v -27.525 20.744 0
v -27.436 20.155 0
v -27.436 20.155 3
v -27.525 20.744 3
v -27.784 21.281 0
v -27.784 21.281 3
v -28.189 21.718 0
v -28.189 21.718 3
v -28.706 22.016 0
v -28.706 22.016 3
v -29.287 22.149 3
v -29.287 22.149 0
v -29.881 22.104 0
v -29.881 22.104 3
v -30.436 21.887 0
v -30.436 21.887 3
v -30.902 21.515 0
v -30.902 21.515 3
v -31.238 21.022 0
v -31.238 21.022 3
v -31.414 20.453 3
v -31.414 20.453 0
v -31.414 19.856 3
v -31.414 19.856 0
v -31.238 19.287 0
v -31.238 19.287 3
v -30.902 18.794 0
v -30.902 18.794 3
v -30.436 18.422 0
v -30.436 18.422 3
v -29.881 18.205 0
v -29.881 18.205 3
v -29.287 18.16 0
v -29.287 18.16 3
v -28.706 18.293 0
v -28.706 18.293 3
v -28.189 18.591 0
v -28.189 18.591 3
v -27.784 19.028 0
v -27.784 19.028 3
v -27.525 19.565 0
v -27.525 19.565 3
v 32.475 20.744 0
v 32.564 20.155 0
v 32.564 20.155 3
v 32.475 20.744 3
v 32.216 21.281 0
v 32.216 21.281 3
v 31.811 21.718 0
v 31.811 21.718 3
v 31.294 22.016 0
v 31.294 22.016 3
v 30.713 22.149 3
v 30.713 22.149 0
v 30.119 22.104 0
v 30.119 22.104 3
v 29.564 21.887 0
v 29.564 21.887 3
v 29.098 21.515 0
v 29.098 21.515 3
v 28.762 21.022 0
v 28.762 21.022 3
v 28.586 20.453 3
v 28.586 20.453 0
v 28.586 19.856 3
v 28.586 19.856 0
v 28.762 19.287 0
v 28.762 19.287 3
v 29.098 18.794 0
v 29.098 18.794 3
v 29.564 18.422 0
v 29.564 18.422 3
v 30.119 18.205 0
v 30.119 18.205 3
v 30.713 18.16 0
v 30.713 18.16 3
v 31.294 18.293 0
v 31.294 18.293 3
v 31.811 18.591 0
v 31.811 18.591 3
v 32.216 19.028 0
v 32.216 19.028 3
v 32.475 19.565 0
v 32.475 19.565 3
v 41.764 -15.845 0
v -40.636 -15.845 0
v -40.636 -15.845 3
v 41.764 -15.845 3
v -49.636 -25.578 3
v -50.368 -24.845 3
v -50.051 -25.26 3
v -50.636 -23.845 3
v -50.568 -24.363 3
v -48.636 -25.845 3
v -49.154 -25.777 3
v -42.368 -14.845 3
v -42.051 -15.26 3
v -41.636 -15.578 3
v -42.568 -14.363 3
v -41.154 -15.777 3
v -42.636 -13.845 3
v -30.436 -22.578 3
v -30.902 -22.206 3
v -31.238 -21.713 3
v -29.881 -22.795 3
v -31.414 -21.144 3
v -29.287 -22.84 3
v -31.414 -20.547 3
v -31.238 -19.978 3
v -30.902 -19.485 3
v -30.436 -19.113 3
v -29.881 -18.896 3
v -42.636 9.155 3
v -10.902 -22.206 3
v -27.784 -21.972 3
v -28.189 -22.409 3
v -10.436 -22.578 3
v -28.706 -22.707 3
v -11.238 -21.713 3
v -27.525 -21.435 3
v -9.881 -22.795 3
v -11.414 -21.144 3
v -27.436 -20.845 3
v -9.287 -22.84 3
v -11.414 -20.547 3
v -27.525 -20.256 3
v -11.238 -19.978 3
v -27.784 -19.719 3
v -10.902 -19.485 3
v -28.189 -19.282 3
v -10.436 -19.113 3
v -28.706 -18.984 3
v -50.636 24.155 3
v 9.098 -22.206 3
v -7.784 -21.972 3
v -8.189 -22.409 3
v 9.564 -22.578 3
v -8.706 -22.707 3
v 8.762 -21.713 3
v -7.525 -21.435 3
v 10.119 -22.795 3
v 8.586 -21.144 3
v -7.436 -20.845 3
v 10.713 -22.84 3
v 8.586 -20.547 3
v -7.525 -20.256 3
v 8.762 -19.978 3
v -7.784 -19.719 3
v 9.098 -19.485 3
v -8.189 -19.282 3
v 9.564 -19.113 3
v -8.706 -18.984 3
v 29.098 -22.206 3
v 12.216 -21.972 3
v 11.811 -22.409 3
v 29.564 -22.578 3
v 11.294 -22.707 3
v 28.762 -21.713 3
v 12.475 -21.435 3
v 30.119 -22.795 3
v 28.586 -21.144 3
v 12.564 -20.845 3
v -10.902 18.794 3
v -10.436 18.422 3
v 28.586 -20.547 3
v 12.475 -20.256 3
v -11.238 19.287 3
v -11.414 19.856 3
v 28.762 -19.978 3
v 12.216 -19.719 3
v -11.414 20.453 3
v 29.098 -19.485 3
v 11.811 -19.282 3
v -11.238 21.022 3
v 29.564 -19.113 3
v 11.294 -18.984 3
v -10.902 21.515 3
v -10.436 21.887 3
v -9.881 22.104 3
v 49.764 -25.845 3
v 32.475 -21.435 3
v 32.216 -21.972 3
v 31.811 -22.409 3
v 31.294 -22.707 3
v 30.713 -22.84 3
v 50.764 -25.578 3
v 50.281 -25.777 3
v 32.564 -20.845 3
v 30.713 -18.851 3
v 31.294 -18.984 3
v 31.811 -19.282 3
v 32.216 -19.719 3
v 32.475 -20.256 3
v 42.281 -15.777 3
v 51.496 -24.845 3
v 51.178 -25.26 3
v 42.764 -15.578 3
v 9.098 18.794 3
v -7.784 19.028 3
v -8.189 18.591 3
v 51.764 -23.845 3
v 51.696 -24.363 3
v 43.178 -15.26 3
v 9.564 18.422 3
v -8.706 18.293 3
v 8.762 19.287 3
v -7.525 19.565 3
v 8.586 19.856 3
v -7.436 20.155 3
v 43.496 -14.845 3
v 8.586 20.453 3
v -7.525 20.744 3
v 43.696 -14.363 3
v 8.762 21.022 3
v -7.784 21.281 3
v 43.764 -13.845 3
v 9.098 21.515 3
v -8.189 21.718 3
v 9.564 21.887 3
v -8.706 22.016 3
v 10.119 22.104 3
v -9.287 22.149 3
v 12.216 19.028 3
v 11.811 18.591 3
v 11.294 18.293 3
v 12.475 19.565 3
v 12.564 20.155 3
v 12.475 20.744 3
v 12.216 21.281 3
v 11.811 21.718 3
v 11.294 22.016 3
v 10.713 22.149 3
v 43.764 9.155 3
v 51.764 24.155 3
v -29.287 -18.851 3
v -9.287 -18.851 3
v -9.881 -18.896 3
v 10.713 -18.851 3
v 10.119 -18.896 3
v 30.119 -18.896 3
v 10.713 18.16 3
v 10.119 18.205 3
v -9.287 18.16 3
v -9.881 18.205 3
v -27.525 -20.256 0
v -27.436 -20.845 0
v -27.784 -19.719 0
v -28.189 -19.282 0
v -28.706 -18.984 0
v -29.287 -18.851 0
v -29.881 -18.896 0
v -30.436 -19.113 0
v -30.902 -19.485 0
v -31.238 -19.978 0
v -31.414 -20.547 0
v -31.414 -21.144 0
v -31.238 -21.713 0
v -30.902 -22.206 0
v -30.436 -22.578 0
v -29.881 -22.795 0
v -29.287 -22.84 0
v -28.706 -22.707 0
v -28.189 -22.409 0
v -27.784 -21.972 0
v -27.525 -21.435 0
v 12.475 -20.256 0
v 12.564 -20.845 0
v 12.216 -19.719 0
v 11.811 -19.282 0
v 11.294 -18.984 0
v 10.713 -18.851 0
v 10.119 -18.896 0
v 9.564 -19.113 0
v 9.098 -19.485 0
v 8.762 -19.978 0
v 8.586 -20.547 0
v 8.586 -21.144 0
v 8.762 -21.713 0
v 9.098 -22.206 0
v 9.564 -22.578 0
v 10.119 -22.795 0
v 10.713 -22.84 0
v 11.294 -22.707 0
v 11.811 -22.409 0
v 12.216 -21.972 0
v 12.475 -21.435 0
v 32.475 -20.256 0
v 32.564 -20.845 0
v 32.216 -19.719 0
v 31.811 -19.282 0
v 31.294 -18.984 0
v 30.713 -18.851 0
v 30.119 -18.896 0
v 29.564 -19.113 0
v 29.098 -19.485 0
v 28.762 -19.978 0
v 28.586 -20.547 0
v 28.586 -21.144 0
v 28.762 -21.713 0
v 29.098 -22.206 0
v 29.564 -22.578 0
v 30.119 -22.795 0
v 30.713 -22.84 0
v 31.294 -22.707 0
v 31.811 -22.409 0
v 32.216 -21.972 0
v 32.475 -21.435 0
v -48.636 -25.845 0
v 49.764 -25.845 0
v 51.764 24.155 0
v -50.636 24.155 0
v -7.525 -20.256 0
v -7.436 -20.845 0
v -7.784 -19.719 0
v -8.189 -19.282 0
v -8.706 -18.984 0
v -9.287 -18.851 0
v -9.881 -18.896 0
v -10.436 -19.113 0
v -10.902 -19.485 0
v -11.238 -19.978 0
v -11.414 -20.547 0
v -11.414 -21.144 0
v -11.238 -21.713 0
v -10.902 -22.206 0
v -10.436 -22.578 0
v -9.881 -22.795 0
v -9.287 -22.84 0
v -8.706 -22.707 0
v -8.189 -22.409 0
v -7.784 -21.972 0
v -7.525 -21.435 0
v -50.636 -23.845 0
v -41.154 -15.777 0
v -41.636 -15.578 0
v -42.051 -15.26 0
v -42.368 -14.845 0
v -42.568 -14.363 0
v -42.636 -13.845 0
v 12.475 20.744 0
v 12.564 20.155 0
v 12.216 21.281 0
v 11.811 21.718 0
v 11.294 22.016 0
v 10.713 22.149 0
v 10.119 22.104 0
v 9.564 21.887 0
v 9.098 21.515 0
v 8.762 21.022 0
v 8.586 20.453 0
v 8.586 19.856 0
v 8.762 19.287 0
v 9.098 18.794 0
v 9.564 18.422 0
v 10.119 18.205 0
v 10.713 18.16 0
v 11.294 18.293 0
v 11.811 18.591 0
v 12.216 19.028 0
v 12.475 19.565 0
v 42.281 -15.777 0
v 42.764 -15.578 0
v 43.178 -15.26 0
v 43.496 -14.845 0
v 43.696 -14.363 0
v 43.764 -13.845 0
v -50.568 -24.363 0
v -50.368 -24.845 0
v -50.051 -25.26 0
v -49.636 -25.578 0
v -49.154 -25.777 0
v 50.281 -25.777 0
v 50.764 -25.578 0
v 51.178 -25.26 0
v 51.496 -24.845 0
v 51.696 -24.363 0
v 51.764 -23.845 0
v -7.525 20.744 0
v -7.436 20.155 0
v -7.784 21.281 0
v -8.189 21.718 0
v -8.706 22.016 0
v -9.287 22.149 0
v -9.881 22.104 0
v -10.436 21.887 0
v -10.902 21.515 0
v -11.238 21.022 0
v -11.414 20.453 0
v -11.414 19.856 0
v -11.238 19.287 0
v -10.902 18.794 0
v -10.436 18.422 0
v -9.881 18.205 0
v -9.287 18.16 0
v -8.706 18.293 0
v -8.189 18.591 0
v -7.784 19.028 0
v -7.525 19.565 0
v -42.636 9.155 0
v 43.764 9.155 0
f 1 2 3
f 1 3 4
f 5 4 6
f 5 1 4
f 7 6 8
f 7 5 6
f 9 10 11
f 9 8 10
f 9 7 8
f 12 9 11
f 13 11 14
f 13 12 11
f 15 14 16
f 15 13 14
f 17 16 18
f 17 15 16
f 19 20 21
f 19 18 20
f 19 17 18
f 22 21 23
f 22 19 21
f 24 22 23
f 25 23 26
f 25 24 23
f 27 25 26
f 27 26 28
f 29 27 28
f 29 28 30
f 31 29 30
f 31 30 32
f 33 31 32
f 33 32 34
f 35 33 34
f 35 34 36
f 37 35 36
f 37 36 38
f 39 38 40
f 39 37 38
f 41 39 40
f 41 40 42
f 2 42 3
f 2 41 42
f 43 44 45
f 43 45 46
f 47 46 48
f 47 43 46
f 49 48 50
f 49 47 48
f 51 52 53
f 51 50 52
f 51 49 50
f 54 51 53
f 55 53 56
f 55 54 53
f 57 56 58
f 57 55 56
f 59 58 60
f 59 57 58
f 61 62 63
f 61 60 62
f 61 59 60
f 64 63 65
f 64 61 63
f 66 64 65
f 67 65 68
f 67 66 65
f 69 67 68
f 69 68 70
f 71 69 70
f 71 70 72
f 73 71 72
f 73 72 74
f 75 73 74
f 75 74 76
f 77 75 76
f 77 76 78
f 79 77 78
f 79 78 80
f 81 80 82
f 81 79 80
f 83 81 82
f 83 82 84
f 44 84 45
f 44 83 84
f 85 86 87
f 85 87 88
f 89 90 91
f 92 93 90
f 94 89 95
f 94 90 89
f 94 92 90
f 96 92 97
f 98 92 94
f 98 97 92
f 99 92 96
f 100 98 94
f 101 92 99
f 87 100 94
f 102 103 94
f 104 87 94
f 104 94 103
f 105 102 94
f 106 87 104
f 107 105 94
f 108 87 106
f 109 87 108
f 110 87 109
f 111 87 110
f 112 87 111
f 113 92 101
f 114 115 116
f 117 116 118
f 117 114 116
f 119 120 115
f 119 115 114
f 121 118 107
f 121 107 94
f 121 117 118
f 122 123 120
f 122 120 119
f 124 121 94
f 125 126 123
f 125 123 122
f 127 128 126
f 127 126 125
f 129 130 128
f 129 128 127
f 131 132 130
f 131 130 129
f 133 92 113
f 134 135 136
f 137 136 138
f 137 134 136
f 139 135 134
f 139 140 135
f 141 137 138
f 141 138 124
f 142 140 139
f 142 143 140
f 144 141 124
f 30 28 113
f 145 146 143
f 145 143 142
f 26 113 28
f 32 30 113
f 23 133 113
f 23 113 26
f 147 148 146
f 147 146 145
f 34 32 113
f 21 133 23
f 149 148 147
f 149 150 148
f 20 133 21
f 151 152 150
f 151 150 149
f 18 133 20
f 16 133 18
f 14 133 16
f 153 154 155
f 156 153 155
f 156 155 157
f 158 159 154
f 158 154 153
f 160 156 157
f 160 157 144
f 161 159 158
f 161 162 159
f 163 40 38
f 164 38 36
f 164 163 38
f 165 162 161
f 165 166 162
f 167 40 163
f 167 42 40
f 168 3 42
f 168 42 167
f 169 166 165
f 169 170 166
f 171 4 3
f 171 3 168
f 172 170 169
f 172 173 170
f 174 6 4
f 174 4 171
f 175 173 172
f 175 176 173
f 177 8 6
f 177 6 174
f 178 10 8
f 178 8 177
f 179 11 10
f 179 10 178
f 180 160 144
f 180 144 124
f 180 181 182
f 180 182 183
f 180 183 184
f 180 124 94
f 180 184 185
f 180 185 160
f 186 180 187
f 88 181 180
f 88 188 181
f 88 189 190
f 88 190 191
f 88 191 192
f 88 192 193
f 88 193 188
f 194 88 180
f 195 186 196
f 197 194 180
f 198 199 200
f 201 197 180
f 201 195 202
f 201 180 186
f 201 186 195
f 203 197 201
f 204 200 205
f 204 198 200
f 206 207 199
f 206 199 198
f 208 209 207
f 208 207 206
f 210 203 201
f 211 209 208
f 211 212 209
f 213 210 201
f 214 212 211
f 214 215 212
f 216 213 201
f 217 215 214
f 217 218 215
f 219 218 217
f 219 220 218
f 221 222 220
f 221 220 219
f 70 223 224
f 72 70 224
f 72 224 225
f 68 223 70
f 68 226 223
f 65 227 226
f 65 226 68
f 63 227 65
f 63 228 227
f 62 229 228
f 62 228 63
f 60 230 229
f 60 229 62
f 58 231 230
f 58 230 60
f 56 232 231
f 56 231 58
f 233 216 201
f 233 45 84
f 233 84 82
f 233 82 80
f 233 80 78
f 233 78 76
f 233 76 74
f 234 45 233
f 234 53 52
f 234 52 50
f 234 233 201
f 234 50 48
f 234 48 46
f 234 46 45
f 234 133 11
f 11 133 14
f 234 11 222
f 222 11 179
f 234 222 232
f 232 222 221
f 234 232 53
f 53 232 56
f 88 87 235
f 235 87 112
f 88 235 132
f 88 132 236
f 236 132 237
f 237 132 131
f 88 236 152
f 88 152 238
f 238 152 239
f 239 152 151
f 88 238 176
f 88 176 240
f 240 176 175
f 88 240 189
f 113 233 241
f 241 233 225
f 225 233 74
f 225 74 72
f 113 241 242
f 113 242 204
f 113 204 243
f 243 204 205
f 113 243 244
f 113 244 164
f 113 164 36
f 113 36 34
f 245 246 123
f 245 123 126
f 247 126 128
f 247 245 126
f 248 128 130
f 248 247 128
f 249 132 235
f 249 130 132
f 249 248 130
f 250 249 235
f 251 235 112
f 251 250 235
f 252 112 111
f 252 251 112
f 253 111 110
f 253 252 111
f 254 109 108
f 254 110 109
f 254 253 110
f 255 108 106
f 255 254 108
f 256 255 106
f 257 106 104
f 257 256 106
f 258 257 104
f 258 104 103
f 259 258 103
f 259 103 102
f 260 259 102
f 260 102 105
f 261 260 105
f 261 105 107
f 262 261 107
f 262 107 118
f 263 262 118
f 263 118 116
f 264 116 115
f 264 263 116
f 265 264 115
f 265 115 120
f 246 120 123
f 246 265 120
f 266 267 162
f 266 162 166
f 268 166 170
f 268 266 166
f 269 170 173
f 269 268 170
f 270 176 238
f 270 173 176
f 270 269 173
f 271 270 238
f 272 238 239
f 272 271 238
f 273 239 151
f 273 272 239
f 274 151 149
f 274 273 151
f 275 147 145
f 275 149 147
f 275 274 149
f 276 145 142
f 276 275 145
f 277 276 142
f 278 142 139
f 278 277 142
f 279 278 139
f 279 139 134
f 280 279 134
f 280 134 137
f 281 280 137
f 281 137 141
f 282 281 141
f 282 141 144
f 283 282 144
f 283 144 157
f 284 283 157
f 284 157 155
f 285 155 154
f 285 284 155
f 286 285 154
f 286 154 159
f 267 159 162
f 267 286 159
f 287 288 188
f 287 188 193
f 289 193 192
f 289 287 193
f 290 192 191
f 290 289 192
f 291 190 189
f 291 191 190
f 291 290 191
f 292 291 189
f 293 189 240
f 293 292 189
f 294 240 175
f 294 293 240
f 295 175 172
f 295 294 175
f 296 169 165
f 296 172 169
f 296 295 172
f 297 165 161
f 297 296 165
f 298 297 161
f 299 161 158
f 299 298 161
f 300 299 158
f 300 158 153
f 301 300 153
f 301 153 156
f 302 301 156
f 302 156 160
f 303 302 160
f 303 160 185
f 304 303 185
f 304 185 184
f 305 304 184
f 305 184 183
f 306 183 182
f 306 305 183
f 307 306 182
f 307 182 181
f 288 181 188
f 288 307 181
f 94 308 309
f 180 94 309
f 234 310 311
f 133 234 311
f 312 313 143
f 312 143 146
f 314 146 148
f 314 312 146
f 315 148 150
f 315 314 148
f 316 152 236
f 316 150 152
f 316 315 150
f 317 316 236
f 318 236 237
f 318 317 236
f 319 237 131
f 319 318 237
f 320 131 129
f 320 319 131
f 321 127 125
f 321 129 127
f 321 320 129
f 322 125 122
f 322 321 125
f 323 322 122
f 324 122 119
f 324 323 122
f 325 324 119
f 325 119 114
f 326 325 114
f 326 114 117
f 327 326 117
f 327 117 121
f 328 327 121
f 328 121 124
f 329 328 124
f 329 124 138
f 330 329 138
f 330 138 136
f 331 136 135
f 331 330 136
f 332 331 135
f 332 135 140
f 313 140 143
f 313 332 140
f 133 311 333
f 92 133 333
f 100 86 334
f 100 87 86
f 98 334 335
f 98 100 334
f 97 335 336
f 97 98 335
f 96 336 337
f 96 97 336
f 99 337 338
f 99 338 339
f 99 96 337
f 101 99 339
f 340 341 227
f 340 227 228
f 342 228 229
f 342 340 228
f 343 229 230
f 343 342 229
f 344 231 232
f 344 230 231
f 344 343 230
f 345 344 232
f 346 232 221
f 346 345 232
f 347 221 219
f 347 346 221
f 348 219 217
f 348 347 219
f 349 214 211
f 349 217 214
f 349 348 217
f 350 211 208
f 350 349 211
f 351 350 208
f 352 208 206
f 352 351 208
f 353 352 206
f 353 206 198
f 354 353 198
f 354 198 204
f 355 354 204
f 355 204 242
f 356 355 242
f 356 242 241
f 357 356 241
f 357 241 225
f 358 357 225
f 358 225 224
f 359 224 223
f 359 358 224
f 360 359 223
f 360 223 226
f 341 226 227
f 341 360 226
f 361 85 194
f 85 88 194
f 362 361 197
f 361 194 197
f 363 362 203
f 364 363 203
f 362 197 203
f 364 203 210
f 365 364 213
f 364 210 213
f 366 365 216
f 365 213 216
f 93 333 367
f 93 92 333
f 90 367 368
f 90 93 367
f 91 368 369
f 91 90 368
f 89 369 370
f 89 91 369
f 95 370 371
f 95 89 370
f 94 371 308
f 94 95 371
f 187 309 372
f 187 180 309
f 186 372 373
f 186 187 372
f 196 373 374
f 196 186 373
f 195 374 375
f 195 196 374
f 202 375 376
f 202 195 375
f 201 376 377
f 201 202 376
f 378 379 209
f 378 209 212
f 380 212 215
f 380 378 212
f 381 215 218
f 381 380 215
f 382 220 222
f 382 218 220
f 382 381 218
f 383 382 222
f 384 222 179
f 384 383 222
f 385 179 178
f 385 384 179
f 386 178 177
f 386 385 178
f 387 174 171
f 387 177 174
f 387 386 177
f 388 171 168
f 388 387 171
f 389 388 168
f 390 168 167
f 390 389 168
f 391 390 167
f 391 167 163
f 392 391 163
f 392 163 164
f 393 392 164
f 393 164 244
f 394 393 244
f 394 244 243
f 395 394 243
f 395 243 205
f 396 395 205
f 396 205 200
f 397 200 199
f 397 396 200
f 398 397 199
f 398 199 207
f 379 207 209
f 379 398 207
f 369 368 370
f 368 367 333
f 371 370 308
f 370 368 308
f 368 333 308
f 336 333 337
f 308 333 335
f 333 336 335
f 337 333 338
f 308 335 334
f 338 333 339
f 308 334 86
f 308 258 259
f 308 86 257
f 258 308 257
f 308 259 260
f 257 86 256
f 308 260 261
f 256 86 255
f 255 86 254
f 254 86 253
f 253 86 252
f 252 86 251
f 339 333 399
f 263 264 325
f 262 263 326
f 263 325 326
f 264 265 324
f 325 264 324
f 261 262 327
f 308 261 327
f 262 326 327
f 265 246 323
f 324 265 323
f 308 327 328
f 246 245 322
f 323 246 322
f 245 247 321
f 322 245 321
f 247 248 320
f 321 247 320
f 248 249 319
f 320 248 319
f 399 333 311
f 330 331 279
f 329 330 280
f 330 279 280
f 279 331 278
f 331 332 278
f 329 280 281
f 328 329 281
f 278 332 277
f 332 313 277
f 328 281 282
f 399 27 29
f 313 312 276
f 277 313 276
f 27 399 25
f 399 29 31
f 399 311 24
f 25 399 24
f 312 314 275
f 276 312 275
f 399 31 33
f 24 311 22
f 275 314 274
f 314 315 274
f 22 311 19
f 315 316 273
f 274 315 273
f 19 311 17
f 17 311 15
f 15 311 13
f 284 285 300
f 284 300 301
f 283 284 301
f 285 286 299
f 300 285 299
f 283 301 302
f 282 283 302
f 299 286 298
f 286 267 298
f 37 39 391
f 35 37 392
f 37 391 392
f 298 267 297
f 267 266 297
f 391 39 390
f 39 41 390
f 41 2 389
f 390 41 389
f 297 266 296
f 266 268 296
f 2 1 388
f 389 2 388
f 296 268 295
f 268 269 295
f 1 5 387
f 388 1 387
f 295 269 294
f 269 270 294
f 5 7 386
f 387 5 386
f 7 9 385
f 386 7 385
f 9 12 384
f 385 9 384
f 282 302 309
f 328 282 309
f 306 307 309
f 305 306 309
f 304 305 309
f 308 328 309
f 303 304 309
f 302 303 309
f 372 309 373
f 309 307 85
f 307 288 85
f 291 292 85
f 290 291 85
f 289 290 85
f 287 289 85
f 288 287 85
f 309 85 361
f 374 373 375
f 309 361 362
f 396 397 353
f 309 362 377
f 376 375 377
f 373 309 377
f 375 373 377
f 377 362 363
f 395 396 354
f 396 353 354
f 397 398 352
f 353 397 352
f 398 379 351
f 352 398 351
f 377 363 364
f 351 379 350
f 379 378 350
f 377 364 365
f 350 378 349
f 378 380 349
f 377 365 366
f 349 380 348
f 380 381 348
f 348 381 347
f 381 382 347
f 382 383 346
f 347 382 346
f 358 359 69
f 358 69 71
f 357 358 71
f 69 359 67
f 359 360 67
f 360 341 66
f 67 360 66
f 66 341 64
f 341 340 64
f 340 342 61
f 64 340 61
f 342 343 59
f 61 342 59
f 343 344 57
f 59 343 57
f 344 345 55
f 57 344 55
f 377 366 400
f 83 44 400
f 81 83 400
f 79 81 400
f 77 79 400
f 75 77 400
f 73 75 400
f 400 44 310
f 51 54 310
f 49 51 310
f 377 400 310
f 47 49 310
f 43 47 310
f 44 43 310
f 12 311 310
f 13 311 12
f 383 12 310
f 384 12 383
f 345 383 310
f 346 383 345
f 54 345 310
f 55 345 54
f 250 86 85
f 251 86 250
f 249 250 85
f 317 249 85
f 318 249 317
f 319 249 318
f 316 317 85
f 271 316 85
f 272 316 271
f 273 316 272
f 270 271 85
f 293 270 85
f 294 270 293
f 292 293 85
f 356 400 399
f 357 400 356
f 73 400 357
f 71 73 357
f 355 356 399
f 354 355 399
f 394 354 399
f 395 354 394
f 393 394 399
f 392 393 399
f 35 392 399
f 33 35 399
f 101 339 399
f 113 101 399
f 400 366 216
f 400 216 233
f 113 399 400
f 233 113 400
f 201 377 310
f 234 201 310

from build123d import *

# Parameters (mm, degrees)
SKETCH1_W               = 86.4
SKETCH1_H               = 25
BOSS_EXTRUDE1_DEPTH     = 3
CUT_EXTRUDE2_DEPTH      = 58.935016495
CUT_EXTRUDE2_DEPTH_BACK = 58.935016495
SKETCH2_R               = 2
FILLET1_R               = 2


with BuildPart() as part:
    # Sketch1 → Boss-Extrude1 (new body)
    with BuildSketch(Plane.XY):
        Polygon((-50.636338419, 24.154507628), (-50.636338419, 18.154507628), (-50.636338419, 16.154507628), (-50.636338419, -25.845492372), (51.763661581, -25.845492372), (51.763661581, 16.154507628), (51.763661581, 18.154507628), (51.763661581, 24.154507628), align=None)
        with Locations((0.563661581, -3.345492372)):
            Rectangle(SKETCH1_W, SKETCH1_H, mode=Mode.SUBTRACT)
    extrude(amount=BOSS_EXTRUDE1_DEPTH)

    # Sketch2 → Cut-Extrude2 (cut, two sides: drawn at the far end of the back side and taken through both)
    with BuildSketch(Plane.XY.offset(3).offset(-CUT_EXTRUDE2_DEPTH_BACK)):
        with Locations((-29.436338419, 20.154507628)):
            Circle(SKETCH2_R)
        with Locations((-29.436338419, -20.845492372)):
            Circle(SKETCH2_R)
        with Locations((-9.436338419, -20.845492372)):
            Circle(SKETCH2_R)
        with Locations((-9.436338419, 20.154507628)):
            Circle(SKETCH2_R)
        with Locations((10.563661581, -20.845492372)):
            Circle(SKETCH2_R)
        with Locations((10.563661581, 20.154507628)):
            Circle(SKETCH2_R)
        with Locations((30.563661581, -20.845492372)):
            Circle(SKETCH2_R)
        with Locations((30.563661581, 20.154507628)):
            Circle(SKETCH2_R)
    extrude(amount=CUT_EXTRUDE2_DEPTH + CUT_EXTRUDE2_DEPTH_BACK, mode=Mode.SUBTRACT)

    # Fillet1
    fillet1_edges = [part.edges().sort_by_distance(p)[0] for p in [
        (51.763661581, -25.845492372, 1.5),
        (-50.636338419, -25.845492372, 1.5),
        (-42.636338419, -15.845492372, 1.5),
        (43.763661581, -15.845492372, 1.5),
    ]]
    fillet(fillet1_edges, radius=FILLET1_R)


solid = part.part
